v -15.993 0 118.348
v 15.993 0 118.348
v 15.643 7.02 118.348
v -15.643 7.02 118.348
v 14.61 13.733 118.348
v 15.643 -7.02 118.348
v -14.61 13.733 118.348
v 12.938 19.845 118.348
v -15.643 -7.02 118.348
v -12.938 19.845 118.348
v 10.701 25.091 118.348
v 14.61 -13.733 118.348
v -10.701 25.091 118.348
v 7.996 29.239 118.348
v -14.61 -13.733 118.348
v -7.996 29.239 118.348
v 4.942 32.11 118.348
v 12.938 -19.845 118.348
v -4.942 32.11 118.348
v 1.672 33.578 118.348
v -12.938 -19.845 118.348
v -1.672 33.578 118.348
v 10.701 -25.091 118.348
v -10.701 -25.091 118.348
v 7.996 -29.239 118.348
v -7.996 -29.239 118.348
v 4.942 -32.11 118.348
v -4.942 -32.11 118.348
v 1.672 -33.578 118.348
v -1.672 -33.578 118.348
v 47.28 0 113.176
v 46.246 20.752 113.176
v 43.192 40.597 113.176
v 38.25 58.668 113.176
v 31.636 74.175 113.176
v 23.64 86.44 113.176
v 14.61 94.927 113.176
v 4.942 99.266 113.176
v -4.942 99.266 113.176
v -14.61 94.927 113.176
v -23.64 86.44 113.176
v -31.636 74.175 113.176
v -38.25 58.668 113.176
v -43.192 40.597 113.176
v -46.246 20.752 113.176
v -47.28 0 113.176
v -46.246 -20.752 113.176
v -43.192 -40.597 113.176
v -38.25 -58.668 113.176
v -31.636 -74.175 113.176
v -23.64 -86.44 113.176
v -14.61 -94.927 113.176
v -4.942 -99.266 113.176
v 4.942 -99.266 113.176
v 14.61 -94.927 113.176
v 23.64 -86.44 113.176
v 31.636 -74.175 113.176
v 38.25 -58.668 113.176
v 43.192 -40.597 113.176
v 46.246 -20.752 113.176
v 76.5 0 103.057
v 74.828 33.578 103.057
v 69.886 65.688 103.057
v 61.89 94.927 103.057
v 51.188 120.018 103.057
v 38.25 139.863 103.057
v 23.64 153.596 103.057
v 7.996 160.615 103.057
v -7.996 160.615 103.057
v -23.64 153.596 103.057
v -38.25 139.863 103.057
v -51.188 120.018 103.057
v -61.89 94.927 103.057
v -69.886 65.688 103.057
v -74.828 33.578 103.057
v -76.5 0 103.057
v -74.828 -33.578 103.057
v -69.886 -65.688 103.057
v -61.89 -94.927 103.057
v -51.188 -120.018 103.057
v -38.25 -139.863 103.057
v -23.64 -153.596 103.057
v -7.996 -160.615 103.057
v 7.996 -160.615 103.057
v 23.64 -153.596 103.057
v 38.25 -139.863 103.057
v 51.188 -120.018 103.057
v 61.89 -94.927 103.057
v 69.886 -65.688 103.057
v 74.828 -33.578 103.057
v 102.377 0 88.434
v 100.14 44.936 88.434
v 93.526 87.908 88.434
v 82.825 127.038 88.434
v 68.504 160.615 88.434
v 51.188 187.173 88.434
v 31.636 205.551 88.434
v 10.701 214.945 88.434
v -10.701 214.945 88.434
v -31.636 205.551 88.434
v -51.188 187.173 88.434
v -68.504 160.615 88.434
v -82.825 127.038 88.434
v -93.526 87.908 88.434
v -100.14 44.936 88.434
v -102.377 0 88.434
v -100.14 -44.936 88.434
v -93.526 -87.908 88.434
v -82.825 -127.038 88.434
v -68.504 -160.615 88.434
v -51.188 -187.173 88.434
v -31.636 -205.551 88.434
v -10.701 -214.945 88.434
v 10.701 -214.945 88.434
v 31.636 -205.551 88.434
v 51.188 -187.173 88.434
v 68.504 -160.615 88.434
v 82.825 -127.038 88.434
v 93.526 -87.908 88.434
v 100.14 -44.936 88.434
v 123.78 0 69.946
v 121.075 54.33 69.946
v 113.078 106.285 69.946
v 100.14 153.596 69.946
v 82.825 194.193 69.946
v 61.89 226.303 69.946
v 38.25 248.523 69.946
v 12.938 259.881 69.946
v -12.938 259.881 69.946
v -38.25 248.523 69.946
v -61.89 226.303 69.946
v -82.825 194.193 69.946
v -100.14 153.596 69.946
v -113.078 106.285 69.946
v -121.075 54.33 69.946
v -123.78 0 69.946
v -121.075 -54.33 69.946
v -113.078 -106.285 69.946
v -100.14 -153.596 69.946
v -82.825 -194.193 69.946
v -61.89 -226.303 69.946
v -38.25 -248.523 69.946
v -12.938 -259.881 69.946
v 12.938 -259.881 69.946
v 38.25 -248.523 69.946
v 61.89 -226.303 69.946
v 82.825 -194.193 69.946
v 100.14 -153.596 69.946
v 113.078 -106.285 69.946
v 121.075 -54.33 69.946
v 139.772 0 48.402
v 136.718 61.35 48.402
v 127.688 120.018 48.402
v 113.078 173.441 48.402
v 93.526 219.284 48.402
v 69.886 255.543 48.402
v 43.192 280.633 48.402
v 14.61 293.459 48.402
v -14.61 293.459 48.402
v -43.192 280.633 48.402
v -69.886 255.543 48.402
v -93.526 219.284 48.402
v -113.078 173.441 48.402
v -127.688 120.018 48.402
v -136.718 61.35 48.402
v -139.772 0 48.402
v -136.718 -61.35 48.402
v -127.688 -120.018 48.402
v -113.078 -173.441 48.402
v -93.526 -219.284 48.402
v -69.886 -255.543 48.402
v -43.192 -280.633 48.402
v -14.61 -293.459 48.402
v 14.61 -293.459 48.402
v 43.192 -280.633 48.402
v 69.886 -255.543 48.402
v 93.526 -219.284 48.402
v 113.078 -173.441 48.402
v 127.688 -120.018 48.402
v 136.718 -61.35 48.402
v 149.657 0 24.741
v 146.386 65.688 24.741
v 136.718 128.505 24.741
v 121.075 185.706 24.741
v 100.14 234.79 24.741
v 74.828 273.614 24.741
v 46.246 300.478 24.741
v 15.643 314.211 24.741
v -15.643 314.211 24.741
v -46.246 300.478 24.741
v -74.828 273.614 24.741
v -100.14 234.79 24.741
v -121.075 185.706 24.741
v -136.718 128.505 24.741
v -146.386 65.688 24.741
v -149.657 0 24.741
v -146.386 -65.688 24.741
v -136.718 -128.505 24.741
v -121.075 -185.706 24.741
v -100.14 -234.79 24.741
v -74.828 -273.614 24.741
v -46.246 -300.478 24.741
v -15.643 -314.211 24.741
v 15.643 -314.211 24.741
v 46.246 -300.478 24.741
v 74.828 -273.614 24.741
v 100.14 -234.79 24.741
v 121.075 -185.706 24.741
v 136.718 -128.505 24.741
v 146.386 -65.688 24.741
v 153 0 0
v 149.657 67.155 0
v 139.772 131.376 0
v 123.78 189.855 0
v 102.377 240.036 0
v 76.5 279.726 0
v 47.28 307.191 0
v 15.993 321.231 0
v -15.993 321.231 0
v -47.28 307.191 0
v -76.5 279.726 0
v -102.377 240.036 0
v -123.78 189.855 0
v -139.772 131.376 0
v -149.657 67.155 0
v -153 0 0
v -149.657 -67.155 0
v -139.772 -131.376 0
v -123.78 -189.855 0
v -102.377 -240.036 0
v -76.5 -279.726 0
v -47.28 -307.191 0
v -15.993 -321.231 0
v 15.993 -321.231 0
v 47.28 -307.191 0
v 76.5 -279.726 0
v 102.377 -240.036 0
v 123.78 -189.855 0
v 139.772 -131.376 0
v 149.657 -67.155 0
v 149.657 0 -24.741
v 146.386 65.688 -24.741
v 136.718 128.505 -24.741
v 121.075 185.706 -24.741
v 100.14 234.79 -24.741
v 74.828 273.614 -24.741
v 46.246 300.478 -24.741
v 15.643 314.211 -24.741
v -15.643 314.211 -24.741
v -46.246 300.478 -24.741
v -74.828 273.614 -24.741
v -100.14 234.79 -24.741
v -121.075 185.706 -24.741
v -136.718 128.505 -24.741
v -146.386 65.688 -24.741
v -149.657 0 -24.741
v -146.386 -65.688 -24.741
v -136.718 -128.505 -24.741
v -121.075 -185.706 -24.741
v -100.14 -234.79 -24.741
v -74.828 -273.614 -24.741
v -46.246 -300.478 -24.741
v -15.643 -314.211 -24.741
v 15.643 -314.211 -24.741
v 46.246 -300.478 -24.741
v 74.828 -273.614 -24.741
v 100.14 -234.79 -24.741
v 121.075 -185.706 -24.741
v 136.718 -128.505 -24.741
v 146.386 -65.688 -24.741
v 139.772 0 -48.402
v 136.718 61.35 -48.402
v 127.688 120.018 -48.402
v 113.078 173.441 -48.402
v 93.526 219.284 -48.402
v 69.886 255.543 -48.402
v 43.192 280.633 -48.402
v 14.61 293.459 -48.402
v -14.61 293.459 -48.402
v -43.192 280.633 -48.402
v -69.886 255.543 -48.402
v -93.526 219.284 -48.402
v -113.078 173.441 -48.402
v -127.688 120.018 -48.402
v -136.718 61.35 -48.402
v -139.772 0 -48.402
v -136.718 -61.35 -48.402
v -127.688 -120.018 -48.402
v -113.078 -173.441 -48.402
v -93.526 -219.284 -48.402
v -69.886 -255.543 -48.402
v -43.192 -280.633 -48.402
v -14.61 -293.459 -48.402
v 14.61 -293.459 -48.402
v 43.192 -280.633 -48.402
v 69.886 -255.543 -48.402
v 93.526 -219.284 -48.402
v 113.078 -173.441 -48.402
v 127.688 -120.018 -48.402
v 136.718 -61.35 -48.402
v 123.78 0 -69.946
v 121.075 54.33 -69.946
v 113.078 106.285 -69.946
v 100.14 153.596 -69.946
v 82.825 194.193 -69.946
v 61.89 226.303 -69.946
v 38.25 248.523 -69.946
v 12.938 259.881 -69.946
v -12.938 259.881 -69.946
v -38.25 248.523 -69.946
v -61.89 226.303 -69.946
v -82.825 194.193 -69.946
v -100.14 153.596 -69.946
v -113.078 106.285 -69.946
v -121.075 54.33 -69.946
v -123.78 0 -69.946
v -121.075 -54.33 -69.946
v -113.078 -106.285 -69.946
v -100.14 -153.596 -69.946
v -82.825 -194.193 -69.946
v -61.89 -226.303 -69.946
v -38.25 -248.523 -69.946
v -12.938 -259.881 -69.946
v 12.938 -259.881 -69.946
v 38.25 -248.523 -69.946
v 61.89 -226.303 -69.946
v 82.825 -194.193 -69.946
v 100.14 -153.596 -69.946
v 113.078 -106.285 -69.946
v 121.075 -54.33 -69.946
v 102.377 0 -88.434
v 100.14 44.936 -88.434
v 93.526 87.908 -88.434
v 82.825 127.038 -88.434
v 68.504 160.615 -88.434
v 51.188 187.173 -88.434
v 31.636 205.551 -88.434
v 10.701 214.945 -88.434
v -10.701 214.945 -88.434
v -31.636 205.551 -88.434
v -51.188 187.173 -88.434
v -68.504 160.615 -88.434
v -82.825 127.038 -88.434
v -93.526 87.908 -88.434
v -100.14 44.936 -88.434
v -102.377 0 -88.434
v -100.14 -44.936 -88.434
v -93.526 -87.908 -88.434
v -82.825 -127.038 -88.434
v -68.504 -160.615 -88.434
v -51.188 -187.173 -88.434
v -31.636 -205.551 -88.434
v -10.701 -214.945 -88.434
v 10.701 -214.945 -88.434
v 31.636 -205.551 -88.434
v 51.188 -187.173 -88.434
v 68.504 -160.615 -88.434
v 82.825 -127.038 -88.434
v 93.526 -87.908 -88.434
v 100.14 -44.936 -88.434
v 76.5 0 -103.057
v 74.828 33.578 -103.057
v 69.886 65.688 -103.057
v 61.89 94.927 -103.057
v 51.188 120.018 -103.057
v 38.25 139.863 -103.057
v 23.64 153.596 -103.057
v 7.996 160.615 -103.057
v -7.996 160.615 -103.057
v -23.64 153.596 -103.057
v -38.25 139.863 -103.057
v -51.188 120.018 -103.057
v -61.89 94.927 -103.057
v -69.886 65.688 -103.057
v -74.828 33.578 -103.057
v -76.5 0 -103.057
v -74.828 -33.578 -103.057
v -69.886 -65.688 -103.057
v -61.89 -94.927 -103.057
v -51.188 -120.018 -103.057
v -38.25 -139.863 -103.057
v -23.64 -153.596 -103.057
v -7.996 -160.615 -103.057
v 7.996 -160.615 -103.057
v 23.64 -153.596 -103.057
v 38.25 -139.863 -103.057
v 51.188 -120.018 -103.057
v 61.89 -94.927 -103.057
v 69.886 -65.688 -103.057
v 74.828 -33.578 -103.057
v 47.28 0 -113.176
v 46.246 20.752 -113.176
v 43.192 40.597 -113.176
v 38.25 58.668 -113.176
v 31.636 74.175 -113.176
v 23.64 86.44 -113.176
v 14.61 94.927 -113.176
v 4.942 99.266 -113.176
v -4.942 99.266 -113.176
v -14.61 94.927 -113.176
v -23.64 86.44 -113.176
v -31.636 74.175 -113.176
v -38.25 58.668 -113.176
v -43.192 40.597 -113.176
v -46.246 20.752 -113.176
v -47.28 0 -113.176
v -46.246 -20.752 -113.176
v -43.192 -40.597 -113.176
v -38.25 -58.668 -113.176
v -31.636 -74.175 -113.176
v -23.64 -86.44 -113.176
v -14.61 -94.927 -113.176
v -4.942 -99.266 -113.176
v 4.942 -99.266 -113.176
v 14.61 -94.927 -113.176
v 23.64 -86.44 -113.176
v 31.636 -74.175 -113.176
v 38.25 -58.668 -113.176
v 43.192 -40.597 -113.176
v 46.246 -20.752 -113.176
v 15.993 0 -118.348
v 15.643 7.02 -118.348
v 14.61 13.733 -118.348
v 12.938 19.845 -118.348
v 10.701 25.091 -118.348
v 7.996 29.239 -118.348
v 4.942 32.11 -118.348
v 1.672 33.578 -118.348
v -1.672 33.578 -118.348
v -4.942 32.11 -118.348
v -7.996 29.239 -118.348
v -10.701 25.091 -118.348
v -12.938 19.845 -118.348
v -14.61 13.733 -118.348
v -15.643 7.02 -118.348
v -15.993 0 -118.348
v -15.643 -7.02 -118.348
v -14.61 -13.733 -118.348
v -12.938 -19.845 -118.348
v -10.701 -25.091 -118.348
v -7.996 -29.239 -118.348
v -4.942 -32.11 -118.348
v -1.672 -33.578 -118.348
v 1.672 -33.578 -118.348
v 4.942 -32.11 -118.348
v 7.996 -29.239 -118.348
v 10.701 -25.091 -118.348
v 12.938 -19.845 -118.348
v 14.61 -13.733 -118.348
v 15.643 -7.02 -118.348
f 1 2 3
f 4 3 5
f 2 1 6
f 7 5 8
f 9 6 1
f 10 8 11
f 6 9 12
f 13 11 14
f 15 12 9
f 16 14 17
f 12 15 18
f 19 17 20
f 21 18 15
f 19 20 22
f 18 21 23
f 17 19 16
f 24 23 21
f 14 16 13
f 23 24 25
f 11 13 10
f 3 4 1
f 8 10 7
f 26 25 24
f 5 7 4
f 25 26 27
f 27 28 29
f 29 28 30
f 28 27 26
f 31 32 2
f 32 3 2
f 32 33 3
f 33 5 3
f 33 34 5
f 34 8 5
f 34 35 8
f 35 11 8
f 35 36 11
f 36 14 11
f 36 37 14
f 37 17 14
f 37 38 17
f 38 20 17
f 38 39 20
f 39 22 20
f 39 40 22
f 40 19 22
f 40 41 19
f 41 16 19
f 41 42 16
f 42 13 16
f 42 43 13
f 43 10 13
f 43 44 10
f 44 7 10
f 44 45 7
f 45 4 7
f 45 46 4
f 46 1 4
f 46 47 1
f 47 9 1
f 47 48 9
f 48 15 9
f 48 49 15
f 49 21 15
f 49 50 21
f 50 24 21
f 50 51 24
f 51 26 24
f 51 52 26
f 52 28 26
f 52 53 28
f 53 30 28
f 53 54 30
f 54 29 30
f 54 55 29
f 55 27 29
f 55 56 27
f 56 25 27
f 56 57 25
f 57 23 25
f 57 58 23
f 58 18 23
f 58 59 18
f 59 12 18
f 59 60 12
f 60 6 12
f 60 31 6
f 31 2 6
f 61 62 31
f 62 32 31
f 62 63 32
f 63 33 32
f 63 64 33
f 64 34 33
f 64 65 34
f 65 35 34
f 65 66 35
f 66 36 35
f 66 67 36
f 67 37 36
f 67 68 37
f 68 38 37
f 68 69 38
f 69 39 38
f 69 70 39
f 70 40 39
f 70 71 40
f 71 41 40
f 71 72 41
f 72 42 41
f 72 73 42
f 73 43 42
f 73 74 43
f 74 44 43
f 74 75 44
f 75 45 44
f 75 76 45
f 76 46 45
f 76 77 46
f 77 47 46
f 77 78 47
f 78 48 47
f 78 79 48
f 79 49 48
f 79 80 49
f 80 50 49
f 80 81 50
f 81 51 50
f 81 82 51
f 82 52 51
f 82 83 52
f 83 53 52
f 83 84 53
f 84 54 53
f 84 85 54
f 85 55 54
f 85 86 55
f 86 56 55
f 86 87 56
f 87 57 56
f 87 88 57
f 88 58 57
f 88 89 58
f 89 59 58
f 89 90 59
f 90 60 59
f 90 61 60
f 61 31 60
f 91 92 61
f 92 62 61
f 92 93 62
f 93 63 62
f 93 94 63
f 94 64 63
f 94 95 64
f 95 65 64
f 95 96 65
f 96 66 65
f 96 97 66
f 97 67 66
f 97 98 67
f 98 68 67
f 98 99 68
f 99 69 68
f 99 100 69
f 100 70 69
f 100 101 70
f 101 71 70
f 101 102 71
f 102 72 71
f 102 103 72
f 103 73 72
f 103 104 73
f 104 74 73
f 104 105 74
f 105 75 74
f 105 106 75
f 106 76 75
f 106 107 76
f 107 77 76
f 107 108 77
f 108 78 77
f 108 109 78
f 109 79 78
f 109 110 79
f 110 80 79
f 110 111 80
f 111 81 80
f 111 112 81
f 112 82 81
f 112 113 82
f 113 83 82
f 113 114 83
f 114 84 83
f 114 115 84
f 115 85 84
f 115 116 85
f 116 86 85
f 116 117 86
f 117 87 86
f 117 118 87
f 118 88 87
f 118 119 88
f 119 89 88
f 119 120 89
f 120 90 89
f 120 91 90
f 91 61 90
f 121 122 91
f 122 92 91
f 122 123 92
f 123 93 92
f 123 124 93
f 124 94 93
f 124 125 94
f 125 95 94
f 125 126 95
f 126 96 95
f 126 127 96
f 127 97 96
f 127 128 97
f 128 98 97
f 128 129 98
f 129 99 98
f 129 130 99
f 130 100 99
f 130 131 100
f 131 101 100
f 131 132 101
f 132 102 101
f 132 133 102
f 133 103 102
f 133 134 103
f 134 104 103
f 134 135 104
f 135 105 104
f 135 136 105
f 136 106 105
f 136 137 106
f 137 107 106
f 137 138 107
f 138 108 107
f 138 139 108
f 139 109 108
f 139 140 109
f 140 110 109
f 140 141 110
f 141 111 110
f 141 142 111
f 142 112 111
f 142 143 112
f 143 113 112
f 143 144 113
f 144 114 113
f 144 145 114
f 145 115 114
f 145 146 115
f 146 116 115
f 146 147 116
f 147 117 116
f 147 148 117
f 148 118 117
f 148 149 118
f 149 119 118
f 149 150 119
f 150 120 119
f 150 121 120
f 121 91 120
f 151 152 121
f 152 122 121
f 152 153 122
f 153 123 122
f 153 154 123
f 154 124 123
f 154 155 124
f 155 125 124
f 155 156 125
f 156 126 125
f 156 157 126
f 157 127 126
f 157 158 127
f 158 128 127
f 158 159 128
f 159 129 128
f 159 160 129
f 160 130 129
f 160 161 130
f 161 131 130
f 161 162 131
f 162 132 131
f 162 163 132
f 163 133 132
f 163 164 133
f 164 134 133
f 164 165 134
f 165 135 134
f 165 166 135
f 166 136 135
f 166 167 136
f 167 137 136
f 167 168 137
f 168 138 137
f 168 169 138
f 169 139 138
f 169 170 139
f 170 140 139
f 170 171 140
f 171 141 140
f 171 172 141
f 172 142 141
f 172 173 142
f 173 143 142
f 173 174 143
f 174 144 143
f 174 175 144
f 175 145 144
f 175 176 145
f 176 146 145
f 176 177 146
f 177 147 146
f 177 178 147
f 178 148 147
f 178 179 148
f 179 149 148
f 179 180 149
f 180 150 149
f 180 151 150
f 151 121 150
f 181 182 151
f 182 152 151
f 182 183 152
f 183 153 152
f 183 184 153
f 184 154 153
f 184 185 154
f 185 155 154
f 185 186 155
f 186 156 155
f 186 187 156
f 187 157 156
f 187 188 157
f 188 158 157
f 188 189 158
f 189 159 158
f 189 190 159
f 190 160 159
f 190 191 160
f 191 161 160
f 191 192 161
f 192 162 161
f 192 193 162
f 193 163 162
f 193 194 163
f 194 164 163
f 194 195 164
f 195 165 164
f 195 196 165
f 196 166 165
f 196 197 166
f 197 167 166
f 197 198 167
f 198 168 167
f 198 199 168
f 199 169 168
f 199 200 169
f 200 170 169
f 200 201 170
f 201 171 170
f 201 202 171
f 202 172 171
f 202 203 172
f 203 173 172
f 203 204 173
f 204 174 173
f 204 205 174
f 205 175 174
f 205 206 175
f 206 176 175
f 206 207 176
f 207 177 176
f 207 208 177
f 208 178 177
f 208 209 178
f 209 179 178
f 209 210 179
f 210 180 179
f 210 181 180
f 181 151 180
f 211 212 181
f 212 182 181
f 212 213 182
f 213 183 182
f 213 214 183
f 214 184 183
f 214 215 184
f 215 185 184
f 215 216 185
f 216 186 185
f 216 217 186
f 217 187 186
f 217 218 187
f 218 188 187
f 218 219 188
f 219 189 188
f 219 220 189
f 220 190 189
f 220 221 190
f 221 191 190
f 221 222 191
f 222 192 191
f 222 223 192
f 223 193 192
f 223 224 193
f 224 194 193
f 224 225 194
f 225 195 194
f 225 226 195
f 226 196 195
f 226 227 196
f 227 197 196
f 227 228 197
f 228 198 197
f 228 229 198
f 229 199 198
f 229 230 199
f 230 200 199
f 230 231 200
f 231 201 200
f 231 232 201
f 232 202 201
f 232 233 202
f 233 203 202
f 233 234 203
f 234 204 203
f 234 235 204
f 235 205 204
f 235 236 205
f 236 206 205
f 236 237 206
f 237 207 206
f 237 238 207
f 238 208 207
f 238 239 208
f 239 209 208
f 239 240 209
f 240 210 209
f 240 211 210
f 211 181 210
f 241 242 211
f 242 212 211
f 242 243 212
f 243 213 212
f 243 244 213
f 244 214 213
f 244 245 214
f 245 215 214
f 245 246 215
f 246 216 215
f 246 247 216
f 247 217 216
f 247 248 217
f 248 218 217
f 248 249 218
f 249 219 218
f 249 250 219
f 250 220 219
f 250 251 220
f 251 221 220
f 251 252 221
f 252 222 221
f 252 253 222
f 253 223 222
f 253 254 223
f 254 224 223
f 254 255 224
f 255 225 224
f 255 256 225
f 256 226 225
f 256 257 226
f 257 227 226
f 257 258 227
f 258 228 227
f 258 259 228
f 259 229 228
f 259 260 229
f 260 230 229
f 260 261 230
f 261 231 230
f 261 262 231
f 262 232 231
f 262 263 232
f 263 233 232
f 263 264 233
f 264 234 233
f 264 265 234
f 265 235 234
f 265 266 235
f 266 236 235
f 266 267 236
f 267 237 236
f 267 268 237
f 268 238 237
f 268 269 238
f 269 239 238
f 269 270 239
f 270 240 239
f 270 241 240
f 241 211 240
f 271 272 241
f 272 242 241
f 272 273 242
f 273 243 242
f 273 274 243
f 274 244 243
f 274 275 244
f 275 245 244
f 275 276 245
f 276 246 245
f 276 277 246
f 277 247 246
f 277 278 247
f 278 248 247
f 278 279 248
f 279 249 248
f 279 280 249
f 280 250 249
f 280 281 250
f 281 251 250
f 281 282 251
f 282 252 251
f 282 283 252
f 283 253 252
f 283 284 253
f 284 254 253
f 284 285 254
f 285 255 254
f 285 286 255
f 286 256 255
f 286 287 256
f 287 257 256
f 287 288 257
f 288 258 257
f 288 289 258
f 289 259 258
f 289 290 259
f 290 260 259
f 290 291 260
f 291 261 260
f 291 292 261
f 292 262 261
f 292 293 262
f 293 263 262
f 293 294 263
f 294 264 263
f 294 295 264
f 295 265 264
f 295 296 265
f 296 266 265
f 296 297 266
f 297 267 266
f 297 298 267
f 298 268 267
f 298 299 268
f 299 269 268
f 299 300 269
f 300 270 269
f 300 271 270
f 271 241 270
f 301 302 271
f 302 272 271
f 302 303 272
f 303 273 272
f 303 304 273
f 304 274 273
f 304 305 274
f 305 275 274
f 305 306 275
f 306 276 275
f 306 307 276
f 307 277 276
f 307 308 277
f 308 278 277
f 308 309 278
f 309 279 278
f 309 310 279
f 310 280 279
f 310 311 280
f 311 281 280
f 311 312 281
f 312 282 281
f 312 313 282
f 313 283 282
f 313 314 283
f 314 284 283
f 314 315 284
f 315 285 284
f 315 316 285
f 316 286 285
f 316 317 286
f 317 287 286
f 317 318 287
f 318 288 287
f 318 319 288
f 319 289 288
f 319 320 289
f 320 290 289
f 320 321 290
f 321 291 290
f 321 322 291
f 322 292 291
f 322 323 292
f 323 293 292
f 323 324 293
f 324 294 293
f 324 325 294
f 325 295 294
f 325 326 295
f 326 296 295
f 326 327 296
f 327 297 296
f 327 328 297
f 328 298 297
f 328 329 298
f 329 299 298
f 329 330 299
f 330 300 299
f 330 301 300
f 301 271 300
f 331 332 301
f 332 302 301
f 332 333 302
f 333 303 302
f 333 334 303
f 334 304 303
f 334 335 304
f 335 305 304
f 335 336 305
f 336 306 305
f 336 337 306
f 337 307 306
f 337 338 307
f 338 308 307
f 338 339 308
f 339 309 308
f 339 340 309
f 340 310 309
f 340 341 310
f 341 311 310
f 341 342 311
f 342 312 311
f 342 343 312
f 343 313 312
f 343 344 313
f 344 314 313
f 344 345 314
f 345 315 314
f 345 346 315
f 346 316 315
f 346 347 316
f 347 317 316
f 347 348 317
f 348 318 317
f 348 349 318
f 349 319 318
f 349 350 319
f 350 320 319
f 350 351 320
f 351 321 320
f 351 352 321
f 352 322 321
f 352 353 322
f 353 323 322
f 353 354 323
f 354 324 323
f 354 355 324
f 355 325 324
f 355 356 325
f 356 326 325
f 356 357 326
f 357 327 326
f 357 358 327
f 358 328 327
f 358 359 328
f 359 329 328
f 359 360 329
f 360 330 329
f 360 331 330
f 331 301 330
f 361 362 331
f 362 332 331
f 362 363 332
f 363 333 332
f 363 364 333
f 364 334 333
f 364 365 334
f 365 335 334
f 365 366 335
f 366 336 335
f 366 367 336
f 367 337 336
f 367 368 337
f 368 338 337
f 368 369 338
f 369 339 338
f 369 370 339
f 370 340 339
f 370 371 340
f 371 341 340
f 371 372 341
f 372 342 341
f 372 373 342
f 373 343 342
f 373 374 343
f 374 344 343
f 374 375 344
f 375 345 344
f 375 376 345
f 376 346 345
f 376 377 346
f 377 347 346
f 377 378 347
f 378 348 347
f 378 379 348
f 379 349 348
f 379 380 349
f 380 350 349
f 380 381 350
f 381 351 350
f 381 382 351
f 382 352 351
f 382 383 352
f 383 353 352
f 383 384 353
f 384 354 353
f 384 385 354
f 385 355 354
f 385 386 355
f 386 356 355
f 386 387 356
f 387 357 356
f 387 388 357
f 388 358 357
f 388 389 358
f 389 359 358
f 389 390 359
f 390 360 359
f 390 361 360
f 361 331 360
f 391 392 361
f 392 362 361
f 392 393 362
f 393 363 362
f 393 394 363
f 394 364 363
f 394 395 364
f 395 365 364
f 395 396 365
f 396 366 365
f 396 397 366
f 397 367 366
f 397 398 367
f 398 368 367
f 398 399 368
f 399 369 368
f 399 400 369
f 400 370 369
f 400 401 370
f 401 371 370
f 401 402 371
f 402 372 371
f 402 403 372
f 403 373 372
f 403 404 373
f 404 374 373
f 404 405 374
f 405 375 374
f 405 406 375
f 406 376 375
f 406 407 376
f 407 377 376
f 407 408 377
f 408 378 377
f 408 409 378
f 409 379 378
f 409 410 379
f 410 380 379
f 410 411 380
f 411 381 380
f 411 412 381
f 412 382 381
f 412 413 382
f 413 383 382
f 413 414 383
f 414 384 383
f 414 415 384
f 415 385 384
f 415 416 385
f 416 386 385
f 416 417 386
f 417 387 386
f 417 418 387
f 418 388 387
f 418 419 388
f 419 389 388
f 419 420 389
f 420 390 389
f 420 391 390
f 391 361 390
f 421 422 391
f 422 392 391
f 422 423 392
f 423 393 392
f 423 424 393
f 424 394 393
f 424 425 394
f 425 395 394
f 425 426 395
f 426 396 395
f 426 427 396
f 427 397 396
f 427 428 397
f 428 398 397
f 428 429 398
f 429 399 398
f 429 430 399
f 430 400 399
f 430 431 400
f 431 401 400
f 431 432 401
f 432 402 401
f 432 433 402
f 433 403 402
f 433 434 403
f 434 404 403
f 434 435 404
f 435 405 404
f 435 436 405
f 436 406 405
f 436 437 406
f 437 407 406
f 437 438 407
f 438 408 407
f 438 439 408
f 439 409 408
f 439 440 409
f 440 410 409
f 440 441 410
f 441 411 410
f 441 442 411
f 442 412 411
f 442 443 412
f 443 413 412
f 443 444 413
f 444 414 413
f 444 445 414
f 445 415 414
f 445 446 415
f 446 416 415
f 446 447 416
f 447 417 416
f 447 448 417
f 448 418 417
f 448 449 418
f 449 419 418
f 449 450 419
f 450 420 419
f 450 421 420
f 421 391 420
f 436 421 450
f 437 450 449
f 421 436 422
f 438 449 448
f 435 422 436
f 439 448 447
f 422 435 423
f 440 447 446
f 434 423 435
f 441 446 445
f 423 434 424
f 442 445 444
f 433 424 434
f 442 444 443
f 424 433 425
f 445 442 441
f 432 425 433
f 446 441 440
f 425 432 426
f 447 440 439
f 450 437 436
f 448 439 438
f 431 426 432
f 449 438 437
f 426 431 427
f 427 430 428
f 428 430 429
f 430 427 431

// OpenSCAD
// Generated by SolidPython 1.0.1 on 2020-07-29 00:46:49


scale(v = [9, 19, 7]) {
	sphere(r = 17);
}
/***********************************************
*********      SolidPython code:      **********
************************************************
 
# import packages: SolidPython
from solid import *
from solid.utils import *
from itertools import chain, combinations, permutations


class Resize:

    def __init__(self, scad_file):
        self.scad_file = scad_file
        #self.scad_file = import_scad(scad_file)
        # cone/cylinder param:
        self.r1 = 0
        self.r2 = 0
        self.h = 0
        # rectangular prism param:
        self.w = 0
        self.l = 0
        # ellipse param:
        self.r = 0

    # import OpenScad code (file name corresponds to shape)


    # classify shape + parameters
    def assign(self, param1, param2, param3):
        if self.scad_file == 'cone.scad':
            self.r1 = param1
            self.r2 = param2
            self.h = param3
        elif self.scad_file == 'cylinder.scad':
            self.r1 = param1
            self.r2 = param2
            self.h = param3
        elif self.scad_file == 'rectangularPrism.scad':
            self.h = param1
            self.l = param2
            self.w = param3
        else:
            self.r = param1
            self.h = param2

    # resize parameters
    def iterate(self):
        x = range(3, 20, 2)
        i = 1
        if self.scad_file == 'cone.scad':
            tempList = list(permutations(x, 2))
            for temp in tempList:
                param1 = temp[0]
                param2 = temp[1]
                filepath = 'produced_scad_files/' + 'cone' + str(param1) + '_' + str(param2) + '_' + '.scad'
                scad_render_to_file(cylinder(h=param1, r1=param2, r2=0), filepath)

        elif self.scad_file == 'cylinder.scad':
            tempList = list(permutations(x, 3))
            for temp in tempList:
                param1 = temp[0]
                param2 = temp[1]
                filepath = 'produced_scad_files/' + 'cylinder' + str(param1) + '_' + str(param2) + '_' + '.scad'
                scad_render_to_file(cylinder(h=param1, r1=param2, r2=param2), filepath)

        elif self.scad_file == 'rectangularPrism.scad':
            tempList = list(permutations(x, 3))
            for temp in tempList:
                param1 = temp[0]
                param2 = temp[1]
                param3 = temp[2]
                filepath = 'produced_scad_files/' + 'rectangularPrism' + str(param1) + '_' + str(param2) + '_' + str(
                    param3) + '.scad'
                scad_render_to_file(cube(size=(param1, param2, param3)), filepath)

        elif self.scad_file == 'ellipse.scad':
            tempList = list(permutations(x, 4))
            for temp in tempList:
                param1 = temp[0]
                param2 = temp[1]
                param3 = temp[2]
                param4 = temp[3]
                filepath = 'produced_scad_files/' + 'ellipse' + str(param1) + '_' + str(param2) + '_' + str(param3) + '_' + str(param4) + '.scad'
                scad_render_to_file(scale([param1, param2, param3])(sphere(r=param4)), filepath)

    def render_to_scadfile(self):
        scad_render_to_file(scad, 'example.scad') 
 
************************************************/
